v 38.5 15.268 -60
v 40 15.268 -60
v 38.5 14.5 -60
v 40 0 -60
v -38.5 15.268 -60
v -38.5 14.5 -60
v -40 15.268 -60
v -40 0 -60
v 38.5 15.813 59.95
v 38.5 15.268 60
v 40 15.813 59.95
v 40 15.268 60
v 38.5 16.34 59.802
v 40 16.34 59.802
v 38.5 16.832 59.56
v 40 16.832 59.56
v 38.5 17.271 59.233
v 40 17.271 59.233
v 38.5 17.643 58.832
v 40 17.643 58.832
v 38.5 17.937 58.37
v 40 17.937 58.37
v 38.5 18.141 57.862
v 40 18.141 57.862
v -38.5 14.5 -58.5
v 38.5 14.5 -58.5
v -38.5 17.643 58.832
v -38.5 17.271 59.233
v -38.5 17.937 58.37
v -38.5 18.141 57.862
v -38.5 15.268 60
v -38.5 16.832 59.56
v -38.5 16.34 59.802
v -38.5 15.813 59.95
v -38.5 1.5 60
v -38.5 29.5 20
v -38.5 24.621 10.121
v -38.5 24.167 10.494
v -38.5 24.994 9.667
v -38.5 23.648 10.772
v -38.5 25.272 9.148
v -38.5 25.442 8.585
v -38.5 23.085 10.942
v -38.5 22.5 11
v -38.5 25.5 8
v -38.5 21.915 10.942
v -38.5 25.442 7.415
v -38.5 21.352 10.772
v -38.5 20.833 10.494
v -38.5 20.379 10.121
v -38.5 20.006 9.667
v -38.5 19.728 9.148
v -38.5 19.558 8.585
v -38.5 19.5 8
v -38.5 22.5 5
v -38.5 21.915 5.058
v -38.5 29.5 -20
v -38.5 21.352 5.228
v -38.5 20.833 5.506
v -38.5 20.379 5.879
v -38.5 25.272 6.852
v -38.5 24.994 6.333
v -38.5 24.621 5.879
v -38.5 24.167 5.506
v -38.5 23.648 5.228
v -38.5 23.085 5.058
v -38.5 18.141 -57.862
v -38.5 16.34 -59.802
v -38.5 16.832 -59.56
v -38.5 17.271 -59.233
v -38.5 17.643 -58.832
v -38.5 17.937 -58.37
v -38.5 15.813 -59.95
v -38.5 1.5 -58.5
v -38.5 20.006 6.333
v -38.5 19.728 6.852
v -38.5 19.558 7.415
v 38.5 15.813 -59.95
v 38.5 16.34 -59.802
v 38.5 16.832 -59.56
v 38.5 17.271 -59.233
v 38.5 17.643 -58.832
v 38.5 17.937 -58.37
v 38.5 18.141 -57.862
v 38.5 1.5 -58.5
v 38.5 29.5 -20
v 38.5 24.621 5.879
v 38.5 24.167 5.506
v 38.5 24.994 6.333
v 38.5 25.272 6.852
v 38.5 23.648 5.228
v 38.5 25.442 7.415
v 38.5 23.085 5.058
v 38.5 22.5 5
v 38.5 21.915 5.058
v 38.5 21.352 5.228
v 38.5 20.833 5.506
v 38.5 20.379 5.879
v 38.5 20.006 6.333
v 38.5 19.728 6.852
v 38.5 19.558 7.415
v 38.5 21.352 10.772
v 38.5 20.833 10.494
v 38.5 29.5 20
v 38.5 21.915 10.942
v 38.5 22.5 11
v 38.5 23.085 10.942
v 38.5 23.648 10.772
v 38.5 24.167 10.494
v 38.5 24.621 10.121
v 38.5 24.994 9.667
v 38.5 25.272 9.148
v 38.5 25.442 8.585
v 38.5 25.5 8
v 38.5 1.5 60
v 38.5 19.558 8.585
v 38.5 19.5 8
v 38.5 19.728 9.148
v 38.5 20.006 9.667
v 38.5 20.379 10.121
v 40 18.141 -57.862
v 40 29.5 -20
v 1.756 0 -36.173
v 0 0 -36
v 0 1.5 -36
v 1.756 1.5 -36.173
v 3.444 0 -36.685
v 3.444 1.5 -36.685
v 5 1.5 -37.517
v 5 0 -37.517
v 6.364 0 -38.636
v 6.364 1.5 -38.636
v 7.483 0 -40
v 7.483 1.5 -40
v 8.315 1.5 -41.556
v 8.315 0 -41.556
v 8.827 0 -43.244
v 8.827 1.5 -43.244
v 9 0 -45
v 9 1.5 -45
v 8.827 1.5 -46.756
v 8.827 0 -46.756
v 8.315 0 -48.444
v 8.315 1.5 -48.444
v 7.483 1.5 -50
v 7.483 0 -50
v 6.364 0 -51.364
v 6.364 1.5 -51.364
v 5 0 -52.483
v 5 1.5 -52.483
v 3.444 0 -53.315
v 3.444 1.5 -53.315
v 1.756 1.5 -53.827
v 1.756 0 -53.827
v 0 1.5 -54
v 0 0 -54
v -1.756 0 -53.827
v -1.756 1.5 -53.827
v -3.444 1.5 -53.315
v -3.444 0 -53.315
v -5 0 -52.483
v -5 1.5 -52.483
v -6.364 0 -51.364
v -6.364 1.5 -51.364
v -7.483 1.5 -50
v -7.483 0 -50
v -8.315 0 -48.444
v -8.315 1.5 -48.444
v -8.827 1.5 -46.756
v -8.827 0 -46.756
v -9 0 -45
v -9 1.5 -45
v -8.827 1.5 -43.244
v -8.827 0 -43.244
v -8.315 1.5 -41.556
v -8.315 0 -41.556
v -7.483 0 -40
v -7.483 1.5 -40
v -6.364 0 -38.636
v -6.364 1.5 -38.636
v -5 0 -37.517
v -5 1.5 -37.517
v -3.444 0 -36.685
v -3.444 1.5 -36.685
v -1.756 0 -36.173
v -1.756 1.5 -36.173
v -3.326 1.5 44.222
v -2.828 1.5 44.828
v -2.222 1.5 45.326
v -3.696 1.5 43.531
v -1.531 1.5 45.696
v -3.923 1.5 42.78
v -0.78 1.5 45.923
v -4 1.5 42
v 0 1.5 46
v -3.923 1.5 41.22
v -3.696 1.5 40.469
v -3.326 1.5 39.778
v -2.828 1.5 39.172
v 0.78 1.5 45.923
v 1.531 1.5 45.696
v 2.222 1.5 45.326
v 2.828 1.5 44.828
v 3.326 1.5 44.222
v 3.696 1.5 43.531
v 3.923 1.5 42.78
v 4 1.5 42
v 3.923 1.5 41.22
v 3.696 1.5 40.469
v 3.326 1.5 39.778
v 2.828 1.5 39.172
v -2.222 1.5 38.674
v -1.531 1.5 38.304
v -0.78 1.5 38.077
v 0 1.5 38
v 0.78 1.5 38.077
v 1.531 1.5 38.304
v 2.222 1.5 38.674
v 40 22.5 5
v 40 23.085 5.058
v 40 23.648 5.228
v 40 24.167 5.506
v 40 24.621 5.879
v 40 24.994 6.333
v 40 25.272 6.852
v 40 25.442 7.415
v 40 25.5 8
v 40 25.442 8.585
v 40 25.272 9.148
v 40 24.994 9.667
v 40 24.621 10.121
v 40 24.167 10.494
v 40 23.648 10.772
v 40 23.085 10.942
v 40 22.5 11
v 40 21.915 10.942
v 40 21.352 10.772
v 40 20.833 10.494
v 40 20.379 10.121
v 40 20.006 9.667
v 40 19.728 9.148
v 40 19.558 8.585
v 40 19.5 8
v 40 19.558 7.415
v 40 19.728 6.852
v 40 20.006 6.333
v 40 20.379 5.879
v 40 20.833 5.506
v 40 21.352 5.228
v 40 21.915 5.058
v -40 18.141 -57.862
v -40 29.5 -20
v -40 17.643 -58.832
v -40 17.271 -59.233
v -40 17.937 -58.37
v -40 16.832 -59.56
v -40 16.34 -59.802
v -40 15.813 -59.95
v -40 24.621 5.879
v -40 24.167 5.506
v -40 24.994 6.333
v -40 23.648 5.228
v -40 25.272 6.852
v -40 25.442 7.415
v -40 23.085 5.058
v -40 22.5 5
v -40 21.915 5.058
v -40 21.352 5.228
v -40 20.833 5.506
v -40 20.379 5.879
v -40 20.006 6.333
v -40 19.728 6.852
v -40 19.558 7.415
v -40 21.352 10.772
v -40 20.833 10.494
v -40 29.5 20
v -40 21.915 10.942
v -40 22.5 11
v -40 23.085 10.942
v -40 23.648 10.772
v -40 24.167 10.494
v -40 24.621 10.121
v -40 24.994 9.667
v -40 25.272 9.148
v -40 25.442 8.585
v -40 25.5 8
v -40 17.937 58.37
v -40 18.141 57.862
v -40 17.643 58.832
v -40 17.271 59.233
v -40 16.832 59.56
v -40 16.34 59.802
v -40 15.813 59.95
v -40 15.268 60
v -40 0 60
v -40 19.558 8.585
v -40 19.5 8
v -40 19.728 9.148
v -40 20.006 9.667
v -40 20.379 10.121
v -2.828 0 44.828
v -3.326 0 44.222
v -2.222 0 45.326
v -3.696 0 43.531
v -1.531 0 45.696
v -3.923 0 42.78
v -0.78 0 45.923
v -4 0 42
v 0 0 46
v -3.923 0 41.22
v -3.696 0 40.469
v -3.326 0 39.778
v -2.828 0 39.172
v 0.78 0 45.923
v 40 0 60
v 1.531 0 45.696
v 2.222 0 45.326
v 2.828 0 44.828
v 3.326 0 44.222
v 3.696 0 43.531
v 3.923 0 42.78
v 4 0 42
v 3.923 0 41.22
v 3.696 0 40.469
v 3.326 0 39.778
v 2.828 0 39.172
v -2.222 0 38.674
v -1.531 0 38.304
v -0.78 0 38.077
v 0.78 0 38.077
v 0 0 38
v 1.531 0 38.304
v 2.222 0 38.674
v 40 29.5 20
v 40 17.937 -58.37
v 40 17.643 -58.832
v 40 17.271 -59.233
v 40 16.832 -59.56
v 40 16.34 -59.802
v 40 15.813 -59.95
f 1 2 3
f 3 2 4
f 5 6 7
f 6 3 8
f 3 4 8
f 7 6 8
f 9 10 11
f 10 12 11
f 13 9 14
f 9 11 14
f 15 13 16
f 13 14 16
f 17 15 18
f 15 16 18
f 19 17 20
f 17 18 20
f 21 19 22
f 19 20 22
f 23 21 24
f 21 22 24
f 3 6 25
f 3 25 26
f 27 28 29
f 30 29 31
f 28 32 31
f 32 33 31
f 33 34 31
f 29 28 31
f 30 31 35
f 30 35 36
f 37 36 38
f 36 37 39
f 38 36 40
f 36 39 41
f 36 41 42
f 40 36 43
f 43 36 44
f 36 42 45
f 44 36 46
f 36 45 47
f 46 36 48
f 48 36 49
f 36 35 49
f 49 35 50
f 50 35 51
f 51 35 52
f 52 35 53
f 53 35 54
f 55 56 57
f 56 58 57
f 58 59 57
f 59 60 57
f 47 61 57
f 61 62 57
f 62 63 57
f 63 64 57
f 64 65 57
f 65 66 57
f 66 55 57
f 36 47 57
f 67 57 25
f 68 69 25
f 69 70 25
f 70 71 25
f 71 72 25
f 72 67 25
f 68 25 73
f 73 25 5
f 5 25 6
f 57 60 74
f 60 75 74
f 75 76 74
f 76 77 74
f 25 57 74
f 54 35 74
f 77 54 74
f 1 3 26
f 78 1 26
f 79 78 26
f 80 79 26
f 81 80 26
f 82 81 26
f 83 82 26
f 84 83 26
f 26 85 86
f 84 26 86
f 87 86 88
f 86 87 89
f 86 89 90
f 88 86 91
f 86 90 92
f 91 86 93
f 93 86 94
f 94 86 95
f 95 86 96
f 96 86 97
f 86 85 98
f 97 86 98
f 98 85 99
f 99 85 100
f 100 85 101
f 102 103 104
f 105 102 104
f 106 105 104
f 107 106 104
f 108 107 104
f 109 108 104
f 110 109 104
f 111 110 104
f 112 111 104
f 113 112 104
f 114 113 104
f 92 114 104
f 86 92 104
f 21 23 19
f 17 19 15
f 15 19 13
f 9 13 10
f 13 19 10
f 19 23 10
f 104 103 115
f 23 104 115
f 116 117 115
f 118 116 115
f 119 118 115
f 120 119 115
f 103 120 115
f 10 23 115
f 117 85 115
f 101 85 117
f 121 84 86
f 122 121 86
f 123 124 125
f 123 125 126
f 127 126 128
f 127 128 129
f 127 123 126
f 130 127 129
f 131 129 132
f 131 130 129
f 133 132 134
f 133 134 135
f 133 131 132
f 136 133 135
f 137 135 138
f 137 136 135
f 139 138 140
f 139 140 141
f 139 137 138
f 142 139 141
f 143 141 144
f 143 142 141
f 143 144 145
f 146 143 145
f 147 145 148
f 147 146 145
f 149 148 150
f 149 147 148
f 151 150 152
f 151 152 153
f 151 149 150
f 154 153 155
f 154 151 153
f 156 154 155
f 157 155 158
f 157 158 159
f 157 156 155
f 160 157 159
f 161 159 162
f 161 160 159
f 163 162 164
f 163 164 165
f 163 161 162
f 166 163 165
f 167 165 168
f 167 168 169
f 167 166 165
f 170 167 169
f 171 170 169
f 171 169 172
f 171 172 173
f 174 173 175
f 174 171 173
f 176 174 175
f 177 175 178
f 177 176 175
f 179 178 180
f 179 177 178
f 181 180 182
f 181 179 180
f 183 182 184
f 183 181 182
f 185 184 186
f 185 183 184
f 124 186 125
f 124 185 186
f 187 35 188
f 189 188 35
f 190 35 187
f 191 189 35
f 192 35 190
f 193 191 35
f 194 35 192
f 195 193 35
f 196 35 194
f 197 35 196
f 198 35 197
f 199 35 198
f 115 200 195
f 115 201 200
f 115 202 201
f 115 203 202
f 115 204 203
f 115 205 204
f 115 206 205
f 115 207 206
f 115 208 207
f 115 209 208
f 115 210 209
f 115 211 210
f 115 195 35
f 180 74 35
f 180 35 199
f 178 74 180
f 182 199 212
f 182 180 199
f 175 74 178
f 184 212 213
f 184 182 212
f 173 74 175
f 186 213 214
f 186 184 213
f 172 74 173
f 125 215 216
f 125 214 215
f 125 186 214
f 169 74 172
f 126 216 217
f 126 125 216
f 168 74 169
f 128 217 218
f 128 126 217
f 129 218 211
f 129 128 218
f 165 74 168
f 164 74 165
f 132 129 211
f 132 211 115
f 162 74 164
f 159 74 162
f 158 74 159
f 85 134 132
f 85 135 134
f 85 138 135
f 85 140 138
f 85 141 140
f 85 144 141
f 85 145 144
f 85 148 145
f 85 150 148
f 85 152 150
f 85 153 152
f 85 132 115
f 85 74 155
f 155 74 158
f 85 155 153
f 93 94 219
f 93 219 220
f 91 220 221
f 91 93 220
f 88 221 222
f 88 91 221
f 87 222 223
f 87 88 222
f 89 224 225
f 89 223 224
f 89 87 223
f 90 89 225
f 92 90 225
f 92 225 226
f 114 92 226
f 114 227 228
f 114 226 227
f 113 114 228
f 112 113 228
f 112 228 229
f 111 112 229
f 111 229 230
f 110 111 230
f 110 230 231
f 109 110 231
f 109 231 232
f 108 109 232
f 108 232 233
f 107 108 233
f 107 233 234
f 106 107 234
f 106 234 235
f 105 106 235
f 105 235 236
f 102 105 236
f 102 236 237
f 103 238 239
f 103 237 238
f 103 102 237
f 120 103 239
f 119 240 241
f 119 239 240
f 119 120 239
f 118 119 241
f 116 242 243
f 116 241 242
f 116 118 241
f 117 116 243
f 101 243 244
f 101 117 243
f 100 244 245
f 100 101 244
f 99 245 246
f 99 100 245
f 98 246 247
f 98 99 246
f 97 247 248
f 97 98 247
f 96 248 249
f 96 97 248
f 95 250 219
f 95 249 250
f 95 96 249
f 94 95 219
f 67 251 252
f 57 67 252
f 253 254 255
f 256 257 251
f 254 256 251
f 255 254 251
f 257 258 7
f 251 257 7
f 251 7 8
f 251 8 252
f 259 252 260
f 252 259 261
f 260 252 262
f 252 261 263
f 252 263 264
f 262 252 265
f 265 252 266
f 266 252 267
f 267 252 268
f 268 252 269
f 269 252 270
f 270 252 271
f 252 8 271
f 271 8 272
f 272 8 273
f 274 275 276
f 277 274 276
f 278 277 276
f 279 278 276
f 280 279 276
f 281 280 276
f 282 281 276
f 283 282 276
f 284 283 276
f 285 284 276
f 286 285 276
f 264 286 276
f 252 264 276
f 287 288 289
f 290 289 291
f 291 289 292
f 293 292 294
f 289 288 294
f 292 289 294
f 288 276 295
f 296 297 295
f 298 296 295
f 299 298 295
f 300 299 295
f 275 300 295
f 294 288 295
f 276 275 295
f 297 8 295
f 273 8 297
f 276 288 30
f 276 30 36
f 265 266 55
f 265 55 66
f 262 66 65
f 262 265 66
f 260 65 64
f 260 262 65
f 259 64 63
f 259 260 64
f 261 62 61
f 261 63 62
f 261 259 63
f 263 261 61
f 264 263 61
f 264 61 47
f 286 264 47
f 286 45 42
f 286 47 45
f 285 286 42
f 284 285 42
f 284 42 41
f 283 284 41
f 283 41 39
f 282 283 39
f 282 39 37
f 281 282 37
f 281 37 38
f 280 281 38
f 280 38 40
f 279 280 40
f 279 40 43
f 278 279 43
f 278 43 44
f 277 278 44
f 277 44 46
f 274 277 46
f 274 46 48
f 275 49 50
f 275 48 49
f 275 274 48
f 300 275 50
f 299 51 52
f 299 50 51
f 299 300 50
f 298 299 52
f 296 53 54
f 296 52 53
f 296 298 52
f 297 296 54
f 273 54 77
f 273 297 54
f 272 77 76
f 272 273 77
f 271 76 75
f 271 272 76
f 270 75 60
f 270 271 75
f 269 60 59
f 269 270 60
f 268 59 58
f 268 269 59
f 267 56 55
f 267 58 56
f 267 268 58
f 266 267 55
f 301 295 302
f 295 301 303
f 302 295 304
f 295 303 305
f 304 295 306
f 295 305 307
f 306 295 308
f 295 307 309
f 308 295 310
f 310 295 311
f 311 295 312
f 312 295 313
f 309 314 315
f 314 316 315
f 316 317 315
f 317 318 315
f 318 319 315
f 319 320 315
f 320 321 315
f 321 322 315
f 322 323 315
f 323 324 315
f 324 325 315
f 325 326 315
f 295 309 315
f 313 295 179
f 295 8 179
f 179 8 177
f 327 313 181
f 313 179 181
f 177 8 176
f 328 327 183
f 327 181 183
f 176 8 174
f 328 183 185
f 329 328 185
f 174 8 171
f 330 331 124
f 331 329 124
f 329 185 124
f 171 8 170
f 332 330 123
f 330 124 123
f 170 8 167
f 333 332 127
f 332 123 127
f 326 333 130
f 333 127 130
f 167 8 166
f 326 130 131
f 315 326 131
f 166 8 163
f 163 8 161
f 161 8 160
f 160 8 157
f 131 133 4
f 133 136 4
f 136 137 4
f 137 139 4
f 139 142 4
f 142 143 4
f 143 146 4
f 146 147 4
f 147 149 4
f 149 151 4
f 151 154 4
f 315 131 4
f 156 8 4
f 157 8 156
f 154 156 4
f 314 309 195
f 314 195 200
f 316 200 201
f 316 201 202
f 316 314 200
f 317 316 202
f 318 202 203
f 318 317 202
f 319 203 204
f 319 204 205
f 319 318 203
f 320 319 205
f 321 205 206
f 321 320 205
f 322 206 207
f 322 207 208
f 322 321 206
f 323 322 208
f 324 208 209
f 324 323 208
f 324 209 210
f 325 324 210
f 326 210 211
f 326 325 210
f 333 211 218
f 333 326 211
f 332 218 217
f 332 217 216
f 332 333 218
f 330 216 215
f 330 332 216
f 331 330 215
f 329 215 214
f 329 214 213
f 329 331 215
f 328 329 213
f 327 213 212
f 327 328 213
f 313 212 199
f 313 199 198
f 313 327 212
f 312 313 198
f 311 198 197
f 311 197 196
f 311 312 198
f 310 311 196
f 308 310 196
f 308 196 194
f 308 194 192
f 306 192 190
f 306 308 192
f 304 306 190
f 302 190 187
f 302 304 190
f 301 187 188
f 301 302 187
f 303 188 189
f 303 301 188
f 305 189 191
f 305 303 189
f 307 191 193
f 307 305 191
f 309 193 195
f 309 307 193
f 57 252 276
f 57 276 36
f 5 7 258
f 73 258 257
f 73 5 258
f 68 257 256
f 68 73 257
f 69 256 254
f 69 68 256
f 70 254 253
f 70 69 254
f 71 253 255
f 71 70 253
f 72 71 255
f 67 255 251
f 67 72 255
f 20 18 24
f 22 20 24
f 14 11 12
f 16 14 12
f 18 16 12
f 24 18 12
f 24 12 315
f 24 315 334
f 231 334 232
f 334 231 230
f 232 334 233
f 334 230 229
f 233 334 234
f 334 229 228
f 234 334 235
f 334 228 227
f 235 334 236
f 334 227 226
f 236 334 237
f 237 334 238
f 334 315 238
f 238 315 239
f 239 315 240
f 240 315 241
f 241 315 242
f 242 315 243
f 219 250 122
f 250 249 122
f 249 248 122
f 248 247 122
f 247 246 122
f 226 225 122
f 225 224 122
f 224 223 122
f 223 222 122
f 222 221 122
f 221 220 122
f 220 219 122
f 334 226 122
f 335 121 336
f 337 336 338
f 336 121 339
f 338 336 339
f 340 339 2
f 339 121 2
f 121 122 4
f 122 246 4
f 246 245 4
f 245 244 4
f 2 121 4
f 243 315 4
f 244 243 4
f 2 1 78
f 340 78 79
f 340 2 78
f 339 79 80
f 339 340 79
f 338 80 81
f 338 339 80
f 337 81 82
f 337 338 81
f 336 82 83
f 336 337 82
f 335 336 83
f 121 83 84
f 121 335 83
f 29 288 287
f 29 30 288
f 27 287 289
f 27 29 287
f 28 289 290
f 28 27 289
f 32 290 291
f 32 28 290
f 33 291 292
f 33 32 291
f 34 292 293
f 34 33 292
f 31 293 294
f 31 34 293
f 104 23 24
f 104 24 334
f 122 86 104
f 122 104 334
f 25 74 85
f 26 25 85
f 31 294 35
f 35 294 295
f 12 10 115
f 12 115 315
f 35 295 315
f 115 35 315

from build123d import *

# Parameters (mm, degrees)
SKETCH1_W               = 80
SKETCH1_H               = 120
SKETCH1_R               = 4
SKETCH1_R_2             = 9
BOSS_EXTRUDE1_DEPTH     = 1.5
SKETCH2_W               = 1.5
SKETCH2_H               = 120
BOSS_EXTRUDE2_DEPTH     = 28
SKETCH2_3_W             = 77
SKETCH2_3_H             = 1.5
BOSS_EXTRUDE3_DEPTH     = 13
CUT_EXTRUDE1_DEPTH      = 78.911809118
CUT_EXTRUDE1_DEPTH_BACK = 78.911809118
SKETCH3_R               = 3
FILLET1_R               = 3


with BuildPart() as part:
    # Sketch1 → Boss-Extrude1 (new body)
    with BuildSketch(Plane(origin=(0, 0, 0), x_dir=(1, 0, 0), z_dir=(0, 1, 0))):
        Rectangle(SKETCH1_W, SKETCH1_H)
        with Locations((0, -42)):
            Circle(SKETCH1_R, mode=Mode.SUBTRACT)
        with Locations((0, 45)):
            Circle(SKETCH1_R_2, mode=Mode.SUBTRACT)
    extrude(amount=BOSS_EXTRUDE1_DEPTH)

    # Sketch2 → Boss-Extrude2 (add)
    with BuildSketch(Plane(origin=(0, 1.5, 0), x_dir=(1, 0, 0), z_dir=(0, 1, 0))):
        with Locations((-39.25, 0)):
            Rectangle(SKETCH2_W, SKETCH2_H)
        with Locations((39.25, 0)):
            Rectangle(SKETCH2_W, SKETCH2_H)
    extrude(amount=BOSS_EXTRUDE2_DEPTH)

    # Sketch2<3> → Boss-Extrude3 (add)
    with BuildSketch(Plane(origin=(0, 1.5, 0), x_dir=(1, 0, 0), z_dir=(0, 1, 0))):
        with Locations((0, 59.25)):
            Rectangle(SKETCH2_3_W, SKETCH2_3_H)
    extrude(amount=BOSS_EXTRUDE3_DEPTH)

    # Sketch3 → Cut-Extrude1 (cut, two sides: drawn at the far end of the back side and taken through both)
    with BuildSketch(Plane(origin=(0, 0, 0), x_dir=(0, 0, -1), z_dir=(1, 0, 0)).offset(-CUT_EXTRUDE1_DEPTH_BACK)):
        with Locations((-8, 22.5)):
            Circle(SKETCH3_R)
        Polygon((20, 29.5), (60, 29.5), (60, 17.5), align=None)
        Polygon((-60, 17.5), (-20, 29.5), (-60, 29.5), align=None)
    extrude(amount=CUT_EXTRUDE1_DEPTH + CUT_EXTRUDE1_DEPTH_BACK, mode=Mode.SUBTRACT)

    # Fillet1
    fillet1_edges = [part.edges().sort_by_distance(p)[0] for p in [
        (39.25, 17.5, 60),
        (-39.25, 17.5, 60),
        (-39.25, 17.5, -60),
        (39.25, 17.5, -60),
    ]]
    fillet(fillet1_edges, radius=FILLET1_R)


solid = part.part
